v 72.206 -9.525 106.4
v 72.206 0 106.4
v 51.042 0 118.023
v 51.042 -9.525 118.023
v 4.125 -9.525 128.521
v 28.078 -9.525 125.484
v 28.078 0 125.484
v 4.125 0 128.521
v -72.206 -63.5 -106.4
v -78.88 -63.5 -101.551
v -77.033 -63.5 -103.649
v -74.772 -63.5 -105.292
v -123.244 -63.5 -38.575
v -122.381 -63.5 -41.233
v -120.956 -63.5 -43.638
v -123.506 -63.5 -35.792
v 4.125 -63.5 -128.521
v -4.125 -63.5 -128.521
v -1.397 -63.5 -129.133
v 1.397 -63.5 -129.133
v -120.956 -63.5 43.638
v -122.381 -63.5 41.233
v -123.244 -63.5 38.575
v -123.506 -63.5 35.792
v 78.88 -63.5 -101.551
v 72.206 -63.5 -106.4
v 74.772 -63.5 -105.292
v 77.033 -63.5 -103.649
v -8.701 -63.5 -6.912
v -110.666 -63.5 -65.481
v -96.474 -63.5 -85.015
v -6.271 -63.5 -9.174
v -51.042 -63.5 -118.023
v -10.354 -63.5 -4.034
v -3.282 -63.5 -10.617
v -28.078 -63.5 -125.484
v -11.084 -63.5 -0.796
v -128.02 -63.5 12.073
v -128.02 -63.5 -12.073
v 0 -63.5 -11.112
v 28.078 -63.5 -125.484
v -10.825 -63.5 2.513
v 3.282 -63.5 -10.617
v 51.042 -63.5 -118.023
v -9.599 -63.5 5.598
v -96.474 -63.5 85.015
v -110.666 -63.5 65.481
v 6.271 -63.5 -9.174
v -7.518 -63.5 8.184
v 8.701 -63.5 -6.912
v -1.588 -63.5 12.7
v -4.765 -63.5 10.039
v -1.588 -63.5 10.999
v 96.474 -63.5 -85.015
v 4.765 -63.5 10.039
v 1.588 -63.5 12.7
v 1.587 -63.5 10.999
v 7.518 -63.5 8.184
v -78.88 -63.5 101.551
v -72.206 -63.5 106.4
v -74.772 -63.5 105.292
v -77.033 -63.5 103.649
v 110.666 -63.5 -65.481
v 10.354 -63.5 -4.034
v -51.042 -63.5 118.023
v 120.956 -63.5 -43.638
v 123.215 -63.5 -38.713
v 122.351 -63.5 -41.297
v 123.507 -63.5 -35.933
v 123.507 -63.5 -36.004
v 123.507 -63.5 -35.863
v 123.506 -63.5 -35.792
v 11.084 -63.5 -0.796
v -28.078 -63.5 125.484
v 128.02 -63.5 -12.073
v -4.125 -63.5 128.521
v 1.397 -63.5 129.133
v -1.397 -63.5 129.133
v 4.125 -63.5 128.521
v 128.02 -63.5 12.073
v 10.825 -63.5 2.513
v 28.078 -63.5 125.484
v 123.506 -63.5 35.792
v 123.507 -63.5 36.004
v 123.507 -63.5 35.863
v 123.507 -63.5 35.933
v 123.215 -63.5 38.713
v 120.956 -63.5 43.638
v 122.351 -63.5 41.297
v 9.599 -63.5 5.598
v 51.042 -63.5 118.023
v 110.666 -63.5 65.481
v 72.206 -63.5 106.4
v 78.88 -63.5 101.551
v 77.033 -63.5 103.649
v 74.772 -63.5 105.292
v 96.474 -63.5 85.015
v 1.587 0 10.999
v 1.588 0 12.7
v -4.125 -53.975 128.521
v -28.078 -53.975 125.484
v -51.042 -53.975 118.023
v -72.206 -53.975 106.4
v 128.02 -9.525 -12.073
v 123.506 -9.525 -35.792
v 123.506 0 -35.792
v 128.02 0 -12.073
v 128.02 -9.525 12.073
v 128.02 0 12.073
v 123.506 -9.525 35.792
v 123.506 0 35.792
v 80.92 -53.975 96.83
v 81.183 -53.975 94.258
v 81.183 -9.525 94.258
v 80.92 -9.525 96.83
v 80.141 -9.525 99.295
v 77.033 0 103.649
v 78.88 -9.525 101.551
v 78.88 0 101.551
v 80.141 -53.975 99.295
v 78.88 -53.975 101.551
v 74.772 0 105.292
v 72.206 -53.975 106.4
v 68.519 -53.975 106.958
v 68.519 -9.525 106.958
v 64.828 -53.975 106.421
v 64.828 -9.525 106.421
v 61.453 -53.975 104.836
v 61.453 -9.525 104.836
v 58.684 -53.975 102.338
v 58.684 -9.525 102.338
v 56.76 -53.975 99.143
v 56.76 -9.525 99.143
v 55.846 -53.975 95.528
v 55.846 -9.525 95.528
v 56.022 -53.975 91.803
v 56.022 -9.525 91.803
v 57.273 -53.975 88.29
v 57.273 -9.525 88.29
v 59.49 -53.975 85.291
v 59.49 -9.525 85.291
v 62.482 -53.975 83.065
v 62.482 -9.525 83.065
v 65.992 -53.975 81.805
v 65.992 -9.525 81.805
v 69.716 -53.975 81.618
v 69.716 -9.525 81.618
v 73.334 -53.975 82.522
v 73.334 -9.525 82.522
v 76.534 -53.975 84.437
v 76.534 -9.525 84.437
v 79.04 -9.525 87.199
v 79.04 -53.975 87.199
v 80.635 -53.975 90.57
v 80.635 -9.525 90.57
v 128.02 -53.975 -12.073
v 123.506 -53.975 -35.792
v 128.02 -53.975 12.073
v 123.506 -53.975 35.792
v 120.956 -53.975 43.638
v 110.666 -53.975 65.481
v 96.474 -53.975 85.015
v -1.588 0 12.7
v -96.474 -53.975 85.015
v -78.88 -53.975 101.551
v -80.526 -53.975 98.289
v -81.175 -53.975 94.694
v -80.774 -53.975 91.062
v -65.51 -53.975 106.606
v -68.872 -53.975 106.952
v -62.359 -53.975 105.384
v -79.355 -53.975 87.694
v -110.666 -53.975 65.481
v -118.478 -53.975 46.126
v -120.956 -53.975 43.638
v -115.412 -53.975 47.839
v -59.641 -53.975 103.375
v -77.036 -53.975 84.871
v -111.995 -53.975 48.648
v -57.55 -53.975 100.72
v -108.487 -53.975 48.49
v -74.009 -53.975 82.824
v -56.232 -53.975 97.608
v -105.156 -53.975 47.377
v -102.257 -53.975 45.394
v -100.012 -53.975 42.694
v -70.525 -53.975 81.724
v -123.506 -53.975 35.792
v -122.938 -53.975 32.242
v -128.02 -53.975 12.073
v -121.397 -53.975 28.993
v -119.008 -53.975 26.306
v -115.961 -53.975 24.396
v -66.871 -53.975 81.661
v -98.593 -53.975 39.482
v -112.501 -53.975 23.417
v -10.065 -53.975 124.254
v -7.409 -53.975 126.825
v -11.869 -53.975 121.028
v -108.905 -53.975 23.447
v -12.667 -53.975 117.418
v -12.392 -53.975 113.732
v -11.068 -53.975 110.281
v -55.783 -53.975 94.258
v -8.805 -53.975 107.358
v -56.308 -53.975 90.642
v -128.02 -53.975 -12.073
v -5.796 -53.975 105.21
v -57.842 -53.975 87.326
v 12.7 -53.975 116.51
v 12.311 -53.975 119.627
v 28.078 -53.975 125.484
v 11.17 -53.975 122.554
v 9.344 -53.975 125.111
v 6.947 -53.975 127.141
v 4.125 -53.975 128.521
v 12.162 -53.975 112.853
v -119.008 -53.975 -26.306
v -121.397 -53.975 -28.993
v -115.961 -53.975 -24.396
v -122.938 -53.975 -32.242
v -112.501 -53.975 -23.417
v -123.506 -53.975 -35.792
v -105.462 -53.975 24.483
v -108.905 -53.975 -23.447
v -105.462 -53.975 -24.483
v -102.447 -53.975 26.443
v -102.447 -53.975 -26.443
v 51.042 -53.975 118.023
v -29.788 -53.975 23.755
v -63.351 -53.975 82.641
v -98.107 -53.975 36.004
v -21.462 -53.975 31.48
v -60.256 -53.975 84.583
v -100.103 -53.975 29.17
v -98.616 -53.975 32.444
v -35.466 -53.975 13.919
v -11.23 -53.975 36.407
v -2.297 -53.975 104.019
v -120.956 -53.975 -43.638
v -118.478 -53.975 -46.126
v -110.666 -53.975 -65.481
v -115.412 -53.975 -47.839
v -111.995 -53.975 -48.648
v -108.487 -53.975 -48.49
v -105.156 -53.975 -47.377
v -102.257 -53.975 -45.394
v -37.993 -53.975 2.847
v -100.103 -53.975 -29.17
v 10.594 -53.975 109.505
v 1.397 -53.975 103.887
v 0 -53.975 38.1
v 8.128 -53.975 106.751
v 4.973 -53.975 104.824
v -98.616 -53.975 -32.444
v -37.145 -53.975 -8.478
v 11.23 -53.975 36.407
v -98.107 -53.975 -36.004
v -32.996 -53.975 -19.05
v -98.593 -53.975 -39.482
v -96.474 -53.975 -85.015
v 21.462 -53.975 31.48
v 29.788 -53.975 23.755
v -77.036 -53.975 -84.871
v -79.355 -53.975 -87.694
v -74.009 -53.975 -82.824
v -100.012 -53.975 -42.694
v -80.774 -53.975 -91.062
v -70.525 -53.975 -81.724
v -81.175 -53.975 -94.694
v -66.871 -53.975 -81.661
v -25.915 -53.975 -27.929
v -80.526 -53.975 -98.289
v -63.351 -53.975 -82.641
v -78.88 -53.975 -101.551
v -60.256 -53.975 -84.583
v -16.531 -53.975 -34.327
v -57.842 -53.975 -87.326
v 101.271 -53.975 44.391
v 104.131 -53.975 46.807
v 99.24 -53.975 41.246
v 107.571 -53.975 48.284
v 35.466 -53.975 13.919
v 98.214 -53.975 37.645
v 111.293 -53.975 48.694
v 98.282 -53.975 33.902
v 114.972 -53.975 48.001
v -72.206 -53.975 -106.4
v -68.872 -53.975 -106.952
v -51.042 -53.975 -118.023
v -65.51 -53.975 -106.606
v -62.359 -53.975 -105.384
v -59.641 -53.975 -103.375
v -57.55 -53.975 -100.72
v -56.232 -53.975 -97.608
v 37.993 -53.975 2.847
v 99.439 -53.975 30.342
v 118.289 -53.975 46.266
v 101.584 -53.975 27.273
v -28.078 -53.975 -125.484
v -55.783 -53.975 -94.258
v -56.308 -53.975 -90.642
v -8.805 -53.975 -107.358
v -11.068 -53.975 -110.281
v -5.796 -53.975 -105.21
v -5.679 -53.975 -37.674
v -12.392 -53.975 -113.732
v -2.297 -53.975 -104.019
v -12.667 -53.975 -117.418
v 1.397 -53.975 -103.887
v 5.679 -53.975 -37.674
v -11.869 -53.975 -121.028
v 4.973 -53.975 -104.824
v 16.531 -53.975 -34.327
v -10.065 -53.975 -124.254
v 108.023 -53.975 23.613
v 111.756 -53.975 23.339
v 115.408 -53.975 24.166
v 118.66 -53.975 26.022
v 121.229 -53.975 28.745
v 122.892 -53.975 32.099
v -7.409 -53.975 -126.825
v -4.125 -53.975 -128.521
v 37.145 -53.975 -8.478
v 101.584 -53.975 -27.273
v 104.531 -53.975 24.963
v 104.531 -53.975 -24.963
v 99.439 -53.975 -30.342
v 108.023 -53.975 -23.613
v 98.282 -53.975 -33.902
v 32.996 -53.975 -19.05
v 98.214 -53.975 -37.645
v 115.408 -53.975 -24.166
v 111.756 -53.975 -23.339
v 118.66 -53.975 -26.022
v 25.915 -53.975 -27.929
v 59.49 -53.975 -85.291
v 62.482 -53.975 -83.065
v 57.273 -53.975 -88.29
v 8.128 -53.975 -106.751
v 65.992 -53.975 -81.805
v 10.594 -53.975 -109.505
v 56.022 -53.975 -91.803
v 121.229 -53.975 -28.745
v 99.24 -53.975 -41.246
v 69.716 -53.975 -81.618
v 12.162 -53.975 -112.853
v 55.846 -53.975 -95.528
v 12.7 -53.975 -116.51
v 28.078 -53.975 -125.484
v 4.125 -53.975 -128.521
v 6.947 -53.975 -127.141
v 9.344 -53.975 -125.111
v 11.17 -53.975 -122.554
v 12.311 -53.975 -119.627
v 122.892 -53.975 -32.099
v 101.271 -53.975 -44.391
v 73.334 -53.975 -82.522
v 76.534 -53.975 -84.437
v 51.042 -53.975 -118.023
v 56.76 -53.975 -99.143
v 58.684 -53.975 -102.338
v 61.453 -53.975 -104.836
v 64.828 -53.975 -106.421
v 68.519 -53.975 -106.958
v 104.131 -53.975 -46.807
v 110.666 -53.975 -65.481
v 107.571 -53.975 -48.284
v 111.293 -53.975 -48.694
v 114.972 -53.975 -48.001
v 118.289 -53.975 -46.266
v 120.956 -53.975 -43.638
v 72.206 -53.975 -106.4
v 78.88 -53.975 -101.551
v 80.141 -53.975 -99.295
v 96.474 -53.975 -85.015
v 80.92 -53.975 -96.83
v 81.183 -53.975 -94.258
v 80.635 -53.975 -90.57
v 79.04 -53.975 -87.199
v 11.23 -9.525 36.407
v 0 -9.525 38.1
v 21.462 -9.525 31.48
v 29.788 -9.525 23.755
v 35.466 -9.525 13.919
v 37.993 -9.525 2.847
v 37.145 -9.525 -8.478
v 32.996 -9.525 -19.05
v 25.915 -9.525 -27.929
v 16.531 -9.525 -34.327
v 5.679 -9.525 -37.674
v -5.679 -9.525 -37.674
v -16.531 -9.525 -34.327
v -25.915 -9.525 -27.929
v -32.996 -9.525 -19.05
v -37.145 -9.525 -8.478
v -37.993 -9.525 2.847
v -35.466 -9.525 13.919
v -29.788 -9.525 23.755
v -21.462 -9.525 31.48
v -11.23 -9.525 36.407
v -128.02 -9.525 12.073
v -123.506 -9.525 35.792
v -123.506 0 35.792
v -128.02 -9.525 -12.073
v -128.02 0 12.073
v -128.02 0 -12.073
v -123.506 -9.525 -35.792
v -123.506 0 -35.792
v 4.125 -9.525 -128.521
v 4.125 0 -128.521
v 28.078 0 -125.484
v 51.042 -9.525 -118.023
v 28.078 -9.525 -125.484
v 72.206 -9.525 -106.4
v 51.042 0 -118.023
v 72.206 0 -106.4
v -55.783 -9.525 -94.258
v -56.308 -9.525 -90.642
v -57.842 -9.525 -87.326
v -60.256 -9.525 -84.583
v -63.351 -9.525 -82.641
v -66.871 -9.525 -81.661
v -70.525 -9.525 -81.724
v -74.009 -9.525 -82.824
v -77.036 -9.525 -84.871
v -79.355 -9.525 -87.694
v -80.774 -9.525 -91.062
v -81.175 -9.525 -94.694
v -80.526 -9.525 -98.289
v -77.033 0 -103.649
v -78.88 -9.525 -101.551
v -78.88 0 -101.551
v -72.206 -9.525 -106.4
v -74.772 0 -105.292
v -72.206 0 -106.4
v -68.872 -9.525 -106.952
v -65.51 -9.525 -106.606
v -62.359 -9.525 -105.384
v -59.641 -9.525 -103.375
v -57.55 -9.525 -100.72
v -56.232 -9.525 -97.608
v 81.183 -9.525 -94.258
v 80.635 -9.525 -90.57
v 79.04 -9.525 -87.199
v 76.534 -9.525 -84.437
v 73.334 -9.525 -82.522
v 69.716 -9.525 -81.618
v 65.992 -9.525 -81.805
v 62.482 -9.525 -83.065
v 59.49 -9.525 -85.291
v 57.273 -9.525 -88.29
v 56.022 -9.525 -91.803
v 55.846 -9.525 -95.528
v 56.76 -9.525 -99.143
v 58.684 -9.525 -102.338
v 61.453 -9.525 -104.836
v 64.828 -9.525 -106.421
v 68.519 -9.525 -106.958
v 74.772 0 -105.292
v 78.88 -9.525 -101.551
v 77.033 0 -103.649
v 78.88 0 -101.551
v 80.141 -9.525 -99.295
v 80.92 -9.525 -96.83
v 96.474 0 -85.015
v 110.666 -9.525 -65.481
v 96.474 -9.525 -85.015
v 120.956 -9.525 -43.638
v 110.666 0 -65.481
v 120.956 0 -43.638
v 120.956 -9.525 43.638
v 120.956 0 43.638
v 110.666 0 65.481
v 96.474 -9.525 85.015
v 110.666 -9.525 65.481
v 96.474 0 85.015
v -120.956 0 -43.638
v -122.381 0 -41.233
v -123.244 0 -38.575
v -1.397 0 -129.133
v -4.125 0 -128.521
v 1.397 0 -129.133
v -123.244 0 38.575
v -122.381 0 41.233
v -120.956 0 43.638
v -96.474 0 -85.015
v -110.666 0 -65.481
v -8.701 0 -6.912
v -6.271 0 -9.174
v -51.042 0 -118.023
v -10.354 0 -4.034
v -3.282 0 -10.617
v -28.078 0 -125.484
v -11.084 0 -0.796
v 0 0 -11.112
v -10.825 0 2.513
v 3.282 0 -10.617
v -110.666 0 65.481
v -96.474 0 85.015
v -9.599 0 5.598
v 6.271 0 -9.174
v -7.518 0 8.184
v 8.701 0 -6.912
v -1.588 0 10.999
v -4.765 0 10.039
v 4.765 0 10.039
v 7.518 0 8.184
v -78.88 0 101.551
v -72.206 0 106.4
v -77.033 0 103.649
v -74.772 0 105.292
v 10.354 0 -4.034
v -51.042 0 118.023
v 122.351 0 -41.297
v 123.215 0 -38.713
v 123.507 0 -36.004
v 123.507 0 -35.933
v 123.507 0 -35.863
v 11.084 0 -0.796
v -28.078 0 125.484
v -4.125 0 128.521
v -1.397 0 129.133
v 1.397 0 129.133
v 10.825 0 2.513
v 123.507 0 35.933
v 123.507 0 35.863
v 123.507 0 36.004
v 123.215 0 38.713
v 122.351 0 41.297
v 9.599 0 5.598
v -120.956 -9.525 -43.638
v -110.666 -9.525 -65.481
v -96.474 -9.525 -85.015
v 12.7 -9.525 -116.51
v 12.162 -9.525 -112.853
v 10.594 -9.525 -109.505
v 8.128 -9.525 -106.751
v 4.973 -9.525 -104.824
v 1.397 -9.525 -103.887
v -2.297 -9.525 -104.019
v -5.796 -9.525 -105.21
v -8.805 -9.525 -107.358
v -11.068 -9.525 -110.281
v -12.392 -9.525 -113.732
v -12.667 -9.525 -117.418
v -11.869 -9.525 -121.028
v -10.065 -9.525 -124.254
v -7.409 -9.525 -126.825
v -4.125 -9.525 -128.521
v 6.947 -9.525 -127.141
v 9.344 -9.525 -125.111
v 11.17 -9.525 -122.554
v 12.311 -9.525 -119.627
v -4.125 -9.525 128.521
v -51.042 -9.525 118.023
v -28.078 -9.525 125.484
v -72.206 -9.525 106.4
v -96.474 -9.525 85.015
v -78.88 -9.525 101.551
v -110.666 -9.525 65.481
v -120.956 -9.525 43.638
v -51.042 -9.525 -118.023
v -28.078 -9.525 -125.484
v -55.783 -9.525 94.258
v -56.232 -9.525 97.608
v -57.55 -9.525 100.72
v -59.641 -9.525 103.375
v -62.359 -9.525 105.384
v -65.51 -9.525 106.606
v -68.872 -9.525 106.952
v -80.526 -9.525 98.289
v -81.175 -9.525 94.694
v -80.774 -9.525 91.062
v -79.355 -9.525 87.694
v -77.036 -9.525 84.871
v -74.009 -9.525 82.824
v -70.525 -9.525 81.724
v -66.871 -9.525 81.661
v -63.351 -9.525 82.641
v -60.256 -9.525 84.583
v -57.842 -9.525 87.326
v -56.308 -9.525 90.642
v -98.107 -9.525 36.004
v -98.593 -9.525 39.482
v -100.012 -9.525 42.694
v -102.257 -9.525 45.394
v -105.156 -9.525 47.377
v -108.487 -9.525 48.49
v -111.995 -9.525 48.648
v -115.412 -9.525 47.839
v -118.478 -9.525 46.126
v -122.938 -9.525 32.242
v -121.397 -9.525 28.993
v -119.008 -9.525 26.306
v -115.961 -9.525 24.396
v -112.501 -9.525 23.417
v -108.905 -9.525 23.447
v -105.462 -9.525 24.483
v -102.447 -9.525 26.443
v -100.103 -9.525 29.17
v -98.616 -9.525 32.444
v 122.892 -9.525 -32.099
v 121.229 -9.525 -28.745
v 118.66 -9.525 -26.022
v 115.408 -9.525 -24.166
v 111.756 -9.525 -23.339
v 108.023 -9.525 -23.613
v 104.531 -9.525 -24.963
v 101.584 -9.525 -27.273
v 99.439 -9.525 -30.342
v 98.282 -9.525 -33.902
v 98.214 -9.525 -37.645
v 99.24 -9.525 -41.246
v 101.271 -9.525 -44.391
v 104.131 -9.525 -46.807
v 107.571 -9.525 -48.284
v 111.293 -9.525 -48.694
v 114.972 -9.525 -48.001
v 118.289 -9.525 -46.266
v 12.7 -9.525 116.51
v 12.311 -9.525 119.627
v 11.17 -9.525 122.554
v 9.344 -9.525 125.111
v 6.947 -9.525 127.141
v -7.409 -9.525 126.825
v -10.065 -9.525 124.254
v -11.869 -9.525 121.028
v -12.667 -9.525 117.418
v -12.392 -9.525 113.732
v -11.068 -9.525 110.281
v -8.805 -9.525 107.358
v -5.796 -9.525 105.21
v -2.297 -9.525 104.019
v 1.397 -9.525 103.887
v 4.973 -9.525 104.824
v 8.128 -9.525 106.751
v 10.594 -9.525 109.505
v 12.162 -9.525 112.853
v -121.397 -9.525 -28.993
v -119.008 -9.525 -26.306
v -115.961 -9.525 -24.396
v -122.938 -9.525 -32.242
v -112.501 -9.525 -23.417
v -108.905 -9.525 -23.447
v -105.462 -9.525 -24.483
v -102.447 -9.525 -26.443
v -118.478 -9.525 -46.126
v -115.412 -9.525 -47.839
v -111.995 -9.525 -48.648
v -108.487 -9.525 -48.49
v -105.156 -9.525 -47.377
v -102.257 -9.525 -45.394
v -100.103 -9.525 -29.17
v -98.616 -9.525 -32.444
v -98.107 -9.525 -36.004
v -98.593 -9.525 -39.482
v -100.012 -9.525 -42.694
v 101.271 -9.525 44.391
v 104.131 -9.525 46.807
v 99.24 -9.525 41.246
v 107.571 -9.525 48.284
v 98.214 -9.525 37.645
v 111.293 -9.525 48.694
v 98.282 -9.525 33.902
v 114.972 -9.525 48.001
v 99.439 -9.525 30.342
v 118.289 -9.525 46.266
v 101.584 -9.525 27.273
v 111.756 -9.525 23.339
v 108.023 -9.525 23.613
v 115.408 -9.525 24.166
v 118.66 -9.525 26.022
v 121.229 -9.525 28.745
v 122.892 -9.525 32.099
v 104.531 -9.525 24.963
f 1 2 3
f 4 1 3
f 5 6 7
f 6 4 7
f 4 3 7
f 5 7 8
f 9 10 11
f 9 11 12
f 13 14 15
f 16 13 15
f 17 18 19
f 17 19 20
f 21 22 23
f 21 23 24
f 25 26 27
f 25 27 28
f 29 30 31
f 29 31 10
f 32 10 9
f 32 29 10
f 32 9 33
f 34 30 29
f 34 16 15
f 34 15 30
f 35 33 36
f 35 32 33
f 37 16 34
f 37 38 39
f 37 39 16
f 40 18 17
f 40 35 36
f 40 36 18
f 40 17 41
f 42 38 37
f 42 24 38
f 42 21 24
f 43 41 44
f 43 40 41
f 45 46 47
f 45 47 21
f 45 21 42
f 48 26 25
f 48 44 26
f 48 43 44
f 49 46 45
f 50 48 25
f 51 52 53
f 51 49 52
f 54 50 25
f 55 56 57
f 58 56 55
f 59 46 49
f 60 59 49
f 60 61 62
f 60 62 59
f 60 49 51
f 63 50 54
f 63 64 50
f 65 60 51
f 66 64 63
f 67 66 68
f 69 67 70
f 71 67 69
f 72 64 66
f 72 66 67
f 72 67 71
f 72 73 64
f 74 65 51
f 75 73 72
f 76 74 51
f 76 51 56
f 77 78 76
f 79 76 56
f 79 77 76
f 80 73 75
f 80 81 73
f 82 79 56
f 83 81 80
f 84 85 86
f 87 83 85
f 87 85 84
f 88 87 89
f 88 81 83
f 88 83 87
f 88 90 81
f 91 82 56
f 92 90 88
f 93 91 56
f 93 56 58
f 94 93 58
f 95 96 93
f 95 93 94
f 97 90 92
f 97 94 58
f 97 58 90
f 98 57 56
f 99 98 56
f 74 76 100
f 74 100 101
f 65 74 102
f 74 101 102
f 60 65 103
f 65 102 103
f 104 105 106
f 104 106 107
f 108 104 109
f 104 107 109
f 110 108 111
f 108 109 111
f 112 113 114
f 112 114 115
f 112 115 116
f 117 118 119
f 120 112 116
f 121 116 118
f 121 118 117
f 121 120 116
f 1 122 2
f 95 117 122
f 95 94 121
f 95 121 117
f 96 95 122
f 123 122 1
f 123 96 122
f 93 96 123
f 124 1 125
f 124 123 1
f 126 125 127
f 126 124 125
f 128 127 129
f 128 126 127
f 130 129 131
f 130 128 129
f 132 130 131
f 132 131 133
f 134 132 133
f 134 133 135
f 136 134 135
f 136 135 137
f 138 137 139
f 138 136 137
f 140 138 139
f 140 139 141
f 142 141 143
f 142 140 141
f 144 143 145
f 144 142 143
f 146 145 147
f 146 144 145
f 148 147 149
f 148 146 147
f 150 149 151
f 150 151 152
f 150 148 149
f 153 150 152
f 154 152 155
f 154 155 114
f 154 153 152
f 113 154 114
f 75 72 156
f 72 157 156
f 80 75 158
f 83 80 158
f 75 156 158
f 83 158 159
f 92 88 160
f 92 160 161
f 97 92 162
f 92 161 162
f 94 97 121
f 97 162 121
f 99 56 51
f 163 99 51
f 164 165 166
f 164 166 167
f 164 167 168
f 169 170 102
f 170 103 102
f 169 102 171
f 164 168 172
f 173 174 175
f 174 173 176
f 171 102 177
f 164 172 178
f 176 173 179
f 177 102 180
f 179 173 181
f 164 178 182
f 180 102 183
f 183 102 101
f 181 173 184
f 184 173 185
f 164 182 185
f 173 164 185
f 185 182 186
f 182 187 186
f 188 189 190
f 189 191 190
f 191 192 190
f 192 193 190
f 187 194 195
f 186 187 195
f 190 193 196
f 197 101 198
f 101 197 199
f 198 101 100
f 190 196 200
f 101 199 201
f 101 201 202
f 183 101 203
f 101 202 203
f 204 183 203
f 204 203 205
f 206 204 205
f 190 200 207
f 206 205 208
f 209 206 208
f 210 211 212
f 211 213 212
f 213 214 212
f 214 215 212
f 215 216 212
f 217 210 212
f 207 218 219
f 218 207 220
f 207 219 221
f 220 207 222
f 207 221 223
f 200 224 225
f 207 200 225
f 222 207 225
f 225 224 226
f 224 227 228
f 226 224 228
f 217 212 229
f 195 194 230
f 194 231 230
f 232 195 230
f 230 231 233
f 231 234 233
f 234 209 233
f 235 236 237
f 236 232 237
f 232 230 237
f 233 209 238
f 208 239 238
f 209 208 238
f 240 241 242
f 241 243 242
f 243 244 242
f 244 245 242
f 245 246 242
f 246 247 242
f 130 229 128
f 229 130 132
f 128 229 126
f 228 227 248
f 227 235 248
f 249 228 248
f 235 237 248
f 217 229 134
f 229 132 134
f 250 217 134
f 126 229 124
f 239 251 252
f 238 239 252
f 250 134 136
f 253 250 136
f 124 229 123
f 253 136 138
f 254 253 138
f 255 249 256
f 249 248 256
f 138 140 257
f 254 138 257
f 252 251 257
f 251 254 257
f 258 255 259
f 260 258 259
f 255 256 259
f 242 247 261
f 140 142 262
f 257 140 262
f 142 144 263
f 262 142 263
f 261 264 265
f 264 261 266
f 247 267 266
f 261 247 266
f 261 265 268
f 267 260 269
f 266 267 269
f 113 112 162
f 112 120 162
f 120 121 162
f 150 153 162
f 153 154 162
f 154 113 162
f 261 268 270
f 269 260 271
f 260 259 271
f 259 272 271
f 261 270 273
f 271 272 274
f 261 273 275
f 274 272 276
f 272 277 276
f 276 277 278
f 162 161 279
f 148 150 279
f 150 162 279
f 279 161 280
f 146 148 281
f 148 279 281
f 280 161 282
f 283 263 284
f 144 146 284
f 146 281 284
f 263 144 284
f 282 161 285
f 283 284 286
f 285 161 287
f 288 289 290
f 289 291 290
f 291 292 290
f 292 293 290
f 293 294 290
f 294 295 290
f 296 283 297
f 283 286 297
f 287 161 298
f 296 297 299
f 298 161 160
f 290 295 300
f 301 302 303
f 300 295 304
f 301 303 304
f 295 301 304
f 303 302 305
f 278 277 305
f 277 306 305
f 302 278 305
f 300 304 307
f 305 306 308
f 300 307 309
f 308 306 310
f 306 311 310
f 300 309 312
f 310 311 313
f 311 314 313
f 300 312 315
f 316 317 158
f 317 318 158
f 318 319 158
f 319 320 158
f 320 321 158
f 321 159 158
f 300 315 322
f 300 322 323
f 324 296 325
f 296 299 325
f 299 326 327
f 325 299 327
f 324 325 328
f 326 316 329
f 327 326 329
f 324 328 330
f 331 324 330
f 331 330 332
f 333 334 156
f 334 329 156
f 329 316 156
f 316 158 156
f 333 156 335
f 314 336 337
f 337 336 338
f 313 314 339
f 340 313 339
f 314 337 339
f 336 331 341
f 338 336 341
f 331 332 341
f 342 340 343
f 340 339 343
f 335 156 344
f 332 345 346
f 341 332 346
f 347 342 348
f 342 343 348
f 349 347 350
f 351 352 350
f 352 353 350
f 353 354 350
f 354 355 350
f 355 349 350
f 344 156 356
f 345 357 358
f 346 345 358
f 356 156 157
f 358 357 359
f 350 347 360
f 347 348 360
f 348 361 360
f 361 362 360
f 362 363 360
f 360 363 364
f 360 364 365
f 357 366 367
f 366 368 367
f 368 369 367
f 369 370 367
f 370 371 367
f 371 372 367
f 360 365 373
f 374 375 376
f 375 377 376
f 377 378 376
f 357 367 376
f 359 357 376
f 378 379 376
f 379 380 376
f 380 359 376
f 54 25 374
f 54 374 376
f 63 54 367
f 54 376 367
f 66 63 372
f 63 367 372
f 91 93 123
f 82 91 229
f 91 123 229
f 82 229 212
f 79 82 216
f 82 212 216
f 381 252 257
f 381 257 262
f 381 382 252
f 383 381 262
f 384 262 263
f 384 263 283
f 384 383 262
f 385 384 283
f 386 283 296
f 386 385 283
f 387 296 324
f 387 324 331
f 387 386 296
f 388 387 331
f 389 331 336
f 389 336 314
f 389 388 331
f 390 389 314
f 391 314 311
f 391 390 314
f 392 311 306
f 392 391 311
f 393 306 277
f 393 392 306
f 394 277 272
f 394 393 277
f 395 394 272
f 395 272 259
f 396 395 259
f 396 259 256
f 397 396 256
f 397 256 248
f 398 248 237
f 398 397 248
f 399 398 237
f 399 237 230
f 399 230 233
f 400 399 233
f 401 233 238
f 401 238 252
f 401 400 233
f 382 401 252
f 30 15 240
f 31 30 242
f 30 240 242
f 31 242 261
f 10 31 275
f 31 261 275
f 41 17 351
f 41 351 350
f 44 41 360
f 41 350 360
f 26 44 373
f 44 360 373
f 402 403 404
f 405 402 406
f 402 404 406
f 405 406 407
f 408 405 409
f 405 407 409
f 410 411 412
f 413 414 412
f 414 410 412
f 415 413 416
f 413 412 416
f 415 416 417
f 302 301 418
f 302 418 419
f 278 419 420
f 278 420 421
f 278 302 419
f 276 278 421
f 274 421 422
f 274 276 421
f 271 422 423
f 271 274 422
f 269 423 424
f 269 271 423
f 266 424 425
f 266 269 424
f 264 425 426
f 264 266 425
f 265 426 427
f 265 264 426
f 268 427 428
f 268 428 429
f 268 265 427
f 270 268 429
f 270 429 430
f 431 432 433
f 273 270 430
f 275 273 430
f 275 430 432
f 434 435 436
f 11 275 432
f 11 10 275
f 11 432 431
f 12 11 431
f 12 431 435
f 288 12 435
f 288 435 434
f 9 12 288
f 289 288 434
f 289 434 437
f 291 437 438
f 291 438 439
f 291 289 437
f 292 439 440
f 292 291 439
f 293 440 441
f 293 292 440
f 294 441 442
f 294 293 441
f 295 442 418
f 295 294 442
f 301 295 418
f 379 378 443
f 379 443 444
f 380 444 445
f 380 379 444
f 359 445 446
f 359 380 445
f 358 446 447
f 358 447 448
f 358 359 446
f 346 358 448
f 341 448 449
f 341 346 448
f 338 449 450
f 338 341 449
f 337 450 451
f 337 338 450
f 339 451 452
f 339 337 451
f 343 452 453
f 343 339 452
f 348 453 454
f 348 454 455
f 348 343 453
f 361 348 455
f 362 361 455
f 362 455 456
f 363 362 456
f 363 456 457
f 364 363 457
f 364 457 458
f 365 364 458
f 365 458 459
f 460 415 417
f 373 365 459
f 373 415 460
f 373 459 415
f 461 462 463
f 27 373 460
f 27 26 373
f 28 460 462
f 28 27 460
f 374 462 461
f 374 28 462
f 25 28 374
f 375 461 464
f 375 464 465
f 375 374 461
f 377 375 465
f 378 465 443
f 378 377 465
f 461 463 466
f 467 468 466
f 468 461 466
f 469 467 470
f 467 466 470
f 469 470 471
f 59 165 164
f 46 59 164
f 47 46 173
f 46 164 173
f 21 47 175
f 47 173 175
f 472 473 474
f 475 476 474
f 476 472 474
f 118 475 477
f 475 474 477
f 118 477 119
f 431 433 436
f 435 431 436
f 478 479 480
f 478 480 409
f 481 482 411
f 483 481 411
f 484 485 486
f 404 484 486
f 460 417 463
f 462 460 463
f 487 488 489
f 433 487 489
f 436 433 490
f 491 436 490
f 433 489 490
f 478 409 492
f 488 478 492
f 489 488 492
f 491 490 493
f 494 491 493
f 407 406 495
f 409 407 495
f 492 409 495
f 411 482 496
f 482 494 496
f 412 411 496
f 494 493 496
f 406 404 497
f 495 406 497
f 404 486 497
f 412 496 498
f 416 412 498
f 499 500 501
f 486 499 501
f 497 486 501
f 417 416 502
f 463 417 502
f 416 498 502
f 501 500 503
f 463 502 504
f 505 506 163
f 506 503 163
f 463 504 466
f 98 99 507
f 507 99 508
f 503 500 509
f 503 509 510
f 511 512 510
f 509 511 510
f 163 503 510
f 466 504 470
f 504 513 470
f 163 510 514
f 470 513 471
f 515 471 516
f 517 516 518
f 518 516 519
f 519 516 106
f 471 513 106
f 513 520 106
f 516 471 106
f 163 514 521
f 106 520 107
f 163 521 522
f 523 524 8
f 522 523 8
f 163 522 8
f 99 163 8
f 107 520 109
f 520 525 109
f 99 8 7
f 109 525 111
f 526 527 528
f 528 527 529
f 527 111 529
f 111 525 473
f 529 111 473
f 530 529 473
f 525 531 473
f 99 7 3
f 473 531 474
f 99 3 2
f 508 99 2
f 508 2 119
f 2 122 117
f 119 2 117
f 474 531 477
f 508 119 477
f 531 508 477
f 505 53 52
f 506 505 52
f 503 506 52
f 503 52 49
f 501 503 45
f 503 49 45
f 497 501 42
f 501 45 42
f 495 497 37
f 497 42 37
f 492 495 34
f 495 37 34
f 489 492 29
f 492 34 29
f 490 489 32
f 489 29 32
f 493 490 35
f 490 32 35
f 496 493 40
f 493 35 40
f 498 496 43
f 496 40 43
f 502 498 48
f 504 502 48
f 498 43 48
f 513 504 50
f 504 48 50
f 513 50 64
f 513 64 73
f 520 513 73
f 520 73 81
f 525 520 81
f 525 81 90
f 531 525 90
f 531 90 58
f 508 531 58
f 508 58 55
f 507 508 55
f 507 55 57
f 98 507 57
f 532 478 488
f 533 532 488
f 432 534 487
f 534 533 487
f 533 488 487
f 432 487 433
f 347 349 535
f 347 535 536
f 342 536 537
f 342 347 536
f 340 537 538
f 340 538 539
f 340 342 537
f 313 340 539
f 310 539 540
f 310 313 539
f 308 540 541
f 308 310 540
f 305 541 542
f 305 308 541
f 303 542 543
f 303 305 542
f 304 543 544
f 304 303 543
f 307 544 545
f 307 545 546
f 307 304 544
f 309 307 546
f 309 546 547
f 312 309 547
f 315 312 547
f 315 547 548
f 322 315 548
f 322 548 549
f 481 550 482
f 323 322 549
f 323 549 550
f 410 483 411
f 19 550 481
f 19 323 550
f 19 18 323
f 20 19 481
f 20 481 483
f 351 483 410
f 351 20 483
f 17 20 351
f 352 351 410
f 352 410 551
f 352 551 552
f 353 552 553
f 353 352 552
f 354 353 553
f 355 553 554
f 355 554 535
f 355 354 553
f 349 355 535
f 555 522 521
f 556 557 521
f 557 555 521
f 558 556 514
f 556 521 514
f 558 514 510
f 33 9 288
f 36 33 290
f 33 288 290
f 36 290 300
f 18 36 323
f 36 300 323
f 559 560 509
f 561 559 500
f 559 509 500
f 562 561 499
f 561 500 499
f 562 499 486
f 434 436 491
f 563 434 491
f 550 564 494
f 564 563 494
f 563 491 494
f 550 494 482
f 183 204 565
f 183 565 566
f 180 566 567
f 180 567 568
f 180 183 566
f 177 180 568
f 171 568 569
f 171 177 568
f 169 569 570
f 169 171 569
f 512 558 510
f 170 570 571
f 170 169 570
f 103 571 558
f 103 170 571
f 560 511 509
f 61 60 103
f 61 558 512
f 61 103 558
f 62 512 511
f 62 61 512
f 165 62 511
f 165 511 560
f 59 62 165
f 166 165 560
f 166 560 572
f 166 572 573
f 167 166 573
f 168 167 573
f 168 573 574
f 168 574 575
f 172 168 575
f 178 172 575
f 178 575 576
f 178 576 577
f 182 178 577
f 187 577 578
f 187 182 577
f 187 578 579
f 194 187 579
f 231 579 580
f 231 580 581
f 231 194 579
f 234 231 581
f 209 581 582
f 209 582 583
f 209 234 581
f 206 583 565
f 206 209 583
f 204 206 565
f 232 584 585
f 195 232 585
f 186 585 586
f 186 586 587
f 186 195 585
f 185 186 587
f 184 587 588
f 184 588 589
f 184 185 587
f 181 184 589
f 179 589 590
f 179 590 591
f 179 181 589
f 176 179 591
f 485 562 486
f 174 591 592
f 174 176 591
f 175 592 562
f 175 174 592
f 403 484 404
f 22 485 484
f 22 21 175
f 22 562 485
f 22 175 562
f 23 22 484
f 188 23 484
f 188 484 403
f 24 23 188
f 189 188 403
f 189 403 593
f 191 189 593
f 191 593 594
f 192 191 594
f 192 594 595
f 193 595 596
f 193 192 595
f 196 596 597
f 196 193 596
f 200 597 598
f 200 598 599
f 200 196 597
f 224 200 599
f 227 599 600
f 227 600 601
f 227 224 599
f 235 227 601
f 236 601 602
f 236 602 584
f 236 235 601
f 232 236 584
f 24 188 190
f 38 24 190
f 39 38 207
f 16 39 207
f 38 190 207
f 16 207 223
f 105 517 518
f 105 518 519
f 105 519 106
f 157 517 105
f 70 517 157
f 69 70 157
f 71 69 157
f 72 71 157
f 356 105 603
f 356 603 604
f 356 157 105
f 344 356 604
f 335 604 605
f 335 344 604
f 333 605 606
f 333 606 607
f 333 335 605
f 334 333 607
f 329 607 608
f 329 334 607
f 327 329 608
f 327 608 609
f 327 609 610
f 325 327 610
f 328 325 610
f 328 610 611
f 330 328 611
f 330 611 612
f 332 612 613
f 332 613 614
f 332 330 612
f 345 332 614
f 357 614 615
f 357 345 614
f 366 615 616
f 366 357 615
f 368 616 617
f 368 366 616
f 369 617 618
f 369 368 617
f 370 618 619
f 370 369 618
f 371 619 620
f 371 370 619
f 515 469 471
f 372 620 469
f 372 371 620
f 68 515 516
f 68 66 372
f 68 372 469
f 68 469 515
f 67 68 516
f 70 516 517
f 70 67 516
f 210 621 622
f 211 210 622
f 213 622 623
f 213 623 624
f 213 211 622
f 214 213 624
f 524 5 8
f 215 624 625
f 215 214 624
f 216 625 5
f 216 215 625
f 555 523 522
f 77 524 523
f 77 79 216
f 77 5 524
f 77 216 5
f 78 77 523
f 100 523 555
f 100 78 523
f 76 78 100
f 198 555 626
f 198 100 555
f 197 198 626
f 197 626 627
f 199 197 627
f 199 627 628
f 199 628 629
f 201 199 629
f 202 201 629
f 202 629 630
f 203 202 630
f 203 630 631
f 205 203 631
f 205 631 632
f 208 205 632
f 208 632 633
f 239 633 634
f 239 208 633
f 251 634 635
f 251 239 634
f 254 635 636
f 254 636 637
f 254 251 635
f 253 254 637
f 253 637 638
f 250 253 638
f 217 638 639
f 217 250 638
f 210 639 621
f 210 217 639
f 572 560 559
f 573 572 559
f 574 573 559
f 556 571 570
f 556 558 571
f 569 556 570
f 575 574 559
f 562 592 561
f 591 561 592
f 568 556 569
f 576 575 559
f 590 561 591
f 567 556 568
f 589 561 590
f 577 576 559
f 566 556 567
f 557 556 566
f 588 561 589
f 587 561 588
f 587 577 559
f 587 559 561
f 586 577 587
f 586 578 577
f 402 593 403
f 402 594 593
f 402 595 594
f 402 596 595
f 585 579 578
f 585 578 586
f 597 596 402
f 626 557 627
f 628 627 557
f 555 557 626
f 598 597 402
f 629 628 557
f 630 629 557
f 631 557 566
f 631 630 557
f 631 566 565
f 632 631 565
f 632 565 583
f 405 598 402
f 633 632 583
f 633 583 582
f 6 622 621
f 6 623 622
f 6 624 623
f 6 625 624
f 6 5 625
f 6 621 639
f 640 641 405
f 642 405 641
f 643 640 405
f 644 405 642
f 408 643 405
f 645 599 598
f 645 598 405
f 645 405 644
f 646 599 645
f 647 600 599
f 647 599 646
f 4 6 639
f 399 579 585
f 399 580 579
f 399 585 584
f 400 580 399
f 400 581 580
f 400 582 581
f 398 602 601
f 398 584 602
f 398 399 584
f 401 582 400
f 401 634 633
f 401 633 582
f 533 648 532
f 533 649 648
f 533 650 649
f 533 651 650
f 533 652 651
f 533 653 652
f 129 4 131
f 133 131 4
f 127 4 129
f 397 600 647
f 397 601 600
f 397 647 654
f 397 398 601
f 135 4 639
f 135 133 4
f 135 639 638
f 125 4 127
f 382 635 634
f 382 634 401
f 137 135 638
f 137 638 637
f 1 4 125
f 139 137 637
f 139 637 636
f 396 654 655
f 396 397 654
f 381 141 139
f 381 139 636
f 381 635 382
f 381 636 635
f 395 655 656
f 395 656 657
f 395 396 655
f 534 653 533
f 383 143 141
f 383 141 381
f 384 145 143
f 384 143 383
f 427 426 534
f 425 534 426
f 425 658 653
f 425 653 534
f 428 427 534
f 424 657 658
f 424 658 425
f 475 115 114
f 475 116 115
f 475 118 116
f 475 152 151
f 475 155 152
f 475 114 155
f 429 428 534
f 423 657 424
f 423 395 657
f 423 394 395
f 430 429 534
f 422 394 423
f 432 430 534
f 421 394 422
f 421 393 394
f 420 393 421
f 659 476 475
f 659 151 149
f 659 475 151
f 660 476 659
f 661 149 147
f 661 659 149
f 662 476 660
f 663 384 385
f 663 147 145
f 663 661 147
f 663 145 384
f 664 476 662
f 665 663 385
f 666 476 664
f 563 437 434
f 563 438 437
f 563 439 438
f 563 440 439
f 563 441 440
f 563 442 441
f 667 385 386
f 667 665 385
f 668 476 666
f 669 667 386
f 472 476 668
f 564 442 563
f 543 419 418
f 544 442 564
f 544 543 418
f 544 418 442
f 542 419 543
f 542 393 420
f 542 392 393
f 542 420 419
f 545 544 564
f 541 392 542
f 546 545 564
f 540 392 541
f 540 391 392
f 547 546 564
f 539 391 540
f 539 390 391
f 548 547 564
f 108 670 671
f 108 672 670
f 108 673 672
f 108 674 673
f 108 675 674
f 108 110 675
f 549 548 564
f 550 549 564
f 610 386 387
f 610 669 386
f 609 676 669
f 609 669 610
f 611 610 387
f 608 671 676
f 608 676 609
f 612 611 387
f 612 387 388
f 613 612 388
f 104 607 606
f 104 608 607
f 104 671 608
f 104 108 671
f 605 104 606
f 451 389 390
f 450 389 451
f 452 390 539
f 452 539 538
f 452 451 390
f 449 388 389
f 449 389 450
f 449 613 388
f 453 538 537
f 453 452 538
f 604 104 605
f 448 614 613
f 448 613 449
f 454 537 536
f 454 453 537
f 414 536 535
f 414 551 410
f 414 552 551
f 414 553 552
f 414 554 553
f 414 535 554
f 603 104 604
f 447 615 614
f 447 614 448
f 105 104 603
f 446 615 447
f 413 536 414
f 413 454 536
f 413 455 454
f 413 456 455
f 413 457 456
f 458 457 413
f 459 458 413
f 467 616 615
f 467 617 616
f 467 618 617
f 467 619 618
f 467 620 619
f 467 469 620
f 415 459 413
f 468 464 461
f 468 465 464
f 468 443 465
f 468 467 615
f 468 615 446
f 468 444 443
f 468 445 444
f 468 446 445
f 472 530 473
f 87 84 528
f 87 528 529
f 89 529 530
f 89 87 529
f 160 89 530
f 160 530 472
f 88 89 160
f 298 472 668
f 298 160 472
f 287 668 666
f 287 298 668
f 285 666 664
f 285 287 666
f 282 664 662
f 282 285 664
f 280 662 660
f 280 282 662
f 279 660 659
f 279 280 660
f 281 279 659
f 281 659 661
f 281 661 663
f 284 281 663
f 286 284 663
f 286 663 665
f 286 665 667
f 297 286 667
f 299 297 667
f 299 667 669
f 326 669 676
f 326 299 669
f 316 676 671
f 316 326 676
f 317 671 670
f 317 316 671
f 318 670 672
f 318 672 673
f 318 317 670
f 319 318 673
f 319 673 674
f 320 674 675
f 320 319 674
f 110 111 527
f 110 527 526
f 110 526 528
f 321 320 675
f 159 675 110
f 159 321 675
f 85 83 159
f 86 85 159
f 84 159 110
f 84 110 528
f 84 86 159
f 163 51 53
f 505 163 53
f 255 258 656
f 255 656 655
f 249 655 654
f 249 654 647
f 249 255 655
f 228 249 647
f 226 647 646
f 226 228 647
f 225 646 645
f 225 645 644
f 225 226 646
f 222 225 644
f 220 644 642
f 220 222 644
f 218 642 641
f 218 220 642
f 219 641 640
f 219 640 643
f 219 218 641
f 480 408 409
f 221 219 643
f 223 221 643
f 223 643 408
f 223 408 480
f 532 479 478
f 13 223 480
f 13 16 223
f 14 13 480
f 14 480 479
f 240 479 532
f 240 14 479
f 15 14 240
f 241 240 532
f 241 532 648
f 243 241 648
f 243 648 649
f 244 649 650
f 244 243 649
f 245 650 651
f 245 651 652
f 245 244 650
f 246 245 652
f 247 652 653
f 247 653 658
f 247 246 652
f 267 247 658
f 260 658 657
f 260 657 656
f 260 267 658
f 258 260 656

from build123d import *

# Parameters (mm, degrees)
F0_R     = 128.5875
F1_DEPTH = 63.5
F2_W     = 44.45
F2_H     = 101.6
F4_R     = 12.7
F5_DEPTH = 63.5
F7_DEPTH = 63.501


with BuildPart() as f1:
    # F0 (on Front) → F1 (new body)
    with BuildSketch(Plane.XZ):
        Circle(F0_R)
    extrude(amount=F1_DEPTH)

    # F2 (on Right) → F3 (revolve, cut)
    with BuildSketch(Plane.YZ):
        with Locations((-31.75, 88.9)):
            Rectangle(F2_W, F2_H)
    revolve(axis=Axis((0, -121.1639214932, 0), (0, 1, 0)), mode=Mode.SUBTRACT)

    # F4 (on face) → F5 (join, through all)
    with BuildSketch(Plane.XZ.offset(63.5)):
        with Locations((0, 116.5098)):
            Circle(F4_R)
        with Locations((-68.4827421875, 94.2584082112)):
            Circle(F4_R)
        with Locations((-110.8074045022, 36.0035082112)):
            Circle(F4_R)
        with Locations((-110.8074045022, -36.0035082112)):
            Circle(F4_R)
        with Locations((-68.4827421875, -94.2584082112)):
            Circle(F4_R)
        with Locations((0, -116.5098)):
            Circle(F4_R)
        with Locations((68.4827421875, -94.2584082112)):
            Circle(F4_R)
        with Locations((110.8074045022, -36.0035082112)):
            Circle(F4_R)
        with Locations((110.8074045022, 36.0035082112)):
            Circle(F4_R)
        with Locations((68.4827421875, 94.2584082112)):
            Circle(F4_R)
    extrude(amount=-F5_DEPTH)

    # F6 (on face) → F7 (cut, through all)
    with BuildSketch(Plane.XZ.offset(63.5)):
        with BuildLine():
            Line((-1.5875, 12.7), (-1.5875, 10.9985226281))
            ThreePointArc((-1.5875, 10.9985226281), (0, -11.1125), (1.5875, 10.9985226281))
            Line((1.5875, 10.9985226281), (1.5875, 12.7))
            Line((1.5875, 12.7), (-1.5875, 12.7))
        make_face()
    extrude(amount=-F7_DEPTH, mode=Mode.SUBTRACT)


solid = f1.part
